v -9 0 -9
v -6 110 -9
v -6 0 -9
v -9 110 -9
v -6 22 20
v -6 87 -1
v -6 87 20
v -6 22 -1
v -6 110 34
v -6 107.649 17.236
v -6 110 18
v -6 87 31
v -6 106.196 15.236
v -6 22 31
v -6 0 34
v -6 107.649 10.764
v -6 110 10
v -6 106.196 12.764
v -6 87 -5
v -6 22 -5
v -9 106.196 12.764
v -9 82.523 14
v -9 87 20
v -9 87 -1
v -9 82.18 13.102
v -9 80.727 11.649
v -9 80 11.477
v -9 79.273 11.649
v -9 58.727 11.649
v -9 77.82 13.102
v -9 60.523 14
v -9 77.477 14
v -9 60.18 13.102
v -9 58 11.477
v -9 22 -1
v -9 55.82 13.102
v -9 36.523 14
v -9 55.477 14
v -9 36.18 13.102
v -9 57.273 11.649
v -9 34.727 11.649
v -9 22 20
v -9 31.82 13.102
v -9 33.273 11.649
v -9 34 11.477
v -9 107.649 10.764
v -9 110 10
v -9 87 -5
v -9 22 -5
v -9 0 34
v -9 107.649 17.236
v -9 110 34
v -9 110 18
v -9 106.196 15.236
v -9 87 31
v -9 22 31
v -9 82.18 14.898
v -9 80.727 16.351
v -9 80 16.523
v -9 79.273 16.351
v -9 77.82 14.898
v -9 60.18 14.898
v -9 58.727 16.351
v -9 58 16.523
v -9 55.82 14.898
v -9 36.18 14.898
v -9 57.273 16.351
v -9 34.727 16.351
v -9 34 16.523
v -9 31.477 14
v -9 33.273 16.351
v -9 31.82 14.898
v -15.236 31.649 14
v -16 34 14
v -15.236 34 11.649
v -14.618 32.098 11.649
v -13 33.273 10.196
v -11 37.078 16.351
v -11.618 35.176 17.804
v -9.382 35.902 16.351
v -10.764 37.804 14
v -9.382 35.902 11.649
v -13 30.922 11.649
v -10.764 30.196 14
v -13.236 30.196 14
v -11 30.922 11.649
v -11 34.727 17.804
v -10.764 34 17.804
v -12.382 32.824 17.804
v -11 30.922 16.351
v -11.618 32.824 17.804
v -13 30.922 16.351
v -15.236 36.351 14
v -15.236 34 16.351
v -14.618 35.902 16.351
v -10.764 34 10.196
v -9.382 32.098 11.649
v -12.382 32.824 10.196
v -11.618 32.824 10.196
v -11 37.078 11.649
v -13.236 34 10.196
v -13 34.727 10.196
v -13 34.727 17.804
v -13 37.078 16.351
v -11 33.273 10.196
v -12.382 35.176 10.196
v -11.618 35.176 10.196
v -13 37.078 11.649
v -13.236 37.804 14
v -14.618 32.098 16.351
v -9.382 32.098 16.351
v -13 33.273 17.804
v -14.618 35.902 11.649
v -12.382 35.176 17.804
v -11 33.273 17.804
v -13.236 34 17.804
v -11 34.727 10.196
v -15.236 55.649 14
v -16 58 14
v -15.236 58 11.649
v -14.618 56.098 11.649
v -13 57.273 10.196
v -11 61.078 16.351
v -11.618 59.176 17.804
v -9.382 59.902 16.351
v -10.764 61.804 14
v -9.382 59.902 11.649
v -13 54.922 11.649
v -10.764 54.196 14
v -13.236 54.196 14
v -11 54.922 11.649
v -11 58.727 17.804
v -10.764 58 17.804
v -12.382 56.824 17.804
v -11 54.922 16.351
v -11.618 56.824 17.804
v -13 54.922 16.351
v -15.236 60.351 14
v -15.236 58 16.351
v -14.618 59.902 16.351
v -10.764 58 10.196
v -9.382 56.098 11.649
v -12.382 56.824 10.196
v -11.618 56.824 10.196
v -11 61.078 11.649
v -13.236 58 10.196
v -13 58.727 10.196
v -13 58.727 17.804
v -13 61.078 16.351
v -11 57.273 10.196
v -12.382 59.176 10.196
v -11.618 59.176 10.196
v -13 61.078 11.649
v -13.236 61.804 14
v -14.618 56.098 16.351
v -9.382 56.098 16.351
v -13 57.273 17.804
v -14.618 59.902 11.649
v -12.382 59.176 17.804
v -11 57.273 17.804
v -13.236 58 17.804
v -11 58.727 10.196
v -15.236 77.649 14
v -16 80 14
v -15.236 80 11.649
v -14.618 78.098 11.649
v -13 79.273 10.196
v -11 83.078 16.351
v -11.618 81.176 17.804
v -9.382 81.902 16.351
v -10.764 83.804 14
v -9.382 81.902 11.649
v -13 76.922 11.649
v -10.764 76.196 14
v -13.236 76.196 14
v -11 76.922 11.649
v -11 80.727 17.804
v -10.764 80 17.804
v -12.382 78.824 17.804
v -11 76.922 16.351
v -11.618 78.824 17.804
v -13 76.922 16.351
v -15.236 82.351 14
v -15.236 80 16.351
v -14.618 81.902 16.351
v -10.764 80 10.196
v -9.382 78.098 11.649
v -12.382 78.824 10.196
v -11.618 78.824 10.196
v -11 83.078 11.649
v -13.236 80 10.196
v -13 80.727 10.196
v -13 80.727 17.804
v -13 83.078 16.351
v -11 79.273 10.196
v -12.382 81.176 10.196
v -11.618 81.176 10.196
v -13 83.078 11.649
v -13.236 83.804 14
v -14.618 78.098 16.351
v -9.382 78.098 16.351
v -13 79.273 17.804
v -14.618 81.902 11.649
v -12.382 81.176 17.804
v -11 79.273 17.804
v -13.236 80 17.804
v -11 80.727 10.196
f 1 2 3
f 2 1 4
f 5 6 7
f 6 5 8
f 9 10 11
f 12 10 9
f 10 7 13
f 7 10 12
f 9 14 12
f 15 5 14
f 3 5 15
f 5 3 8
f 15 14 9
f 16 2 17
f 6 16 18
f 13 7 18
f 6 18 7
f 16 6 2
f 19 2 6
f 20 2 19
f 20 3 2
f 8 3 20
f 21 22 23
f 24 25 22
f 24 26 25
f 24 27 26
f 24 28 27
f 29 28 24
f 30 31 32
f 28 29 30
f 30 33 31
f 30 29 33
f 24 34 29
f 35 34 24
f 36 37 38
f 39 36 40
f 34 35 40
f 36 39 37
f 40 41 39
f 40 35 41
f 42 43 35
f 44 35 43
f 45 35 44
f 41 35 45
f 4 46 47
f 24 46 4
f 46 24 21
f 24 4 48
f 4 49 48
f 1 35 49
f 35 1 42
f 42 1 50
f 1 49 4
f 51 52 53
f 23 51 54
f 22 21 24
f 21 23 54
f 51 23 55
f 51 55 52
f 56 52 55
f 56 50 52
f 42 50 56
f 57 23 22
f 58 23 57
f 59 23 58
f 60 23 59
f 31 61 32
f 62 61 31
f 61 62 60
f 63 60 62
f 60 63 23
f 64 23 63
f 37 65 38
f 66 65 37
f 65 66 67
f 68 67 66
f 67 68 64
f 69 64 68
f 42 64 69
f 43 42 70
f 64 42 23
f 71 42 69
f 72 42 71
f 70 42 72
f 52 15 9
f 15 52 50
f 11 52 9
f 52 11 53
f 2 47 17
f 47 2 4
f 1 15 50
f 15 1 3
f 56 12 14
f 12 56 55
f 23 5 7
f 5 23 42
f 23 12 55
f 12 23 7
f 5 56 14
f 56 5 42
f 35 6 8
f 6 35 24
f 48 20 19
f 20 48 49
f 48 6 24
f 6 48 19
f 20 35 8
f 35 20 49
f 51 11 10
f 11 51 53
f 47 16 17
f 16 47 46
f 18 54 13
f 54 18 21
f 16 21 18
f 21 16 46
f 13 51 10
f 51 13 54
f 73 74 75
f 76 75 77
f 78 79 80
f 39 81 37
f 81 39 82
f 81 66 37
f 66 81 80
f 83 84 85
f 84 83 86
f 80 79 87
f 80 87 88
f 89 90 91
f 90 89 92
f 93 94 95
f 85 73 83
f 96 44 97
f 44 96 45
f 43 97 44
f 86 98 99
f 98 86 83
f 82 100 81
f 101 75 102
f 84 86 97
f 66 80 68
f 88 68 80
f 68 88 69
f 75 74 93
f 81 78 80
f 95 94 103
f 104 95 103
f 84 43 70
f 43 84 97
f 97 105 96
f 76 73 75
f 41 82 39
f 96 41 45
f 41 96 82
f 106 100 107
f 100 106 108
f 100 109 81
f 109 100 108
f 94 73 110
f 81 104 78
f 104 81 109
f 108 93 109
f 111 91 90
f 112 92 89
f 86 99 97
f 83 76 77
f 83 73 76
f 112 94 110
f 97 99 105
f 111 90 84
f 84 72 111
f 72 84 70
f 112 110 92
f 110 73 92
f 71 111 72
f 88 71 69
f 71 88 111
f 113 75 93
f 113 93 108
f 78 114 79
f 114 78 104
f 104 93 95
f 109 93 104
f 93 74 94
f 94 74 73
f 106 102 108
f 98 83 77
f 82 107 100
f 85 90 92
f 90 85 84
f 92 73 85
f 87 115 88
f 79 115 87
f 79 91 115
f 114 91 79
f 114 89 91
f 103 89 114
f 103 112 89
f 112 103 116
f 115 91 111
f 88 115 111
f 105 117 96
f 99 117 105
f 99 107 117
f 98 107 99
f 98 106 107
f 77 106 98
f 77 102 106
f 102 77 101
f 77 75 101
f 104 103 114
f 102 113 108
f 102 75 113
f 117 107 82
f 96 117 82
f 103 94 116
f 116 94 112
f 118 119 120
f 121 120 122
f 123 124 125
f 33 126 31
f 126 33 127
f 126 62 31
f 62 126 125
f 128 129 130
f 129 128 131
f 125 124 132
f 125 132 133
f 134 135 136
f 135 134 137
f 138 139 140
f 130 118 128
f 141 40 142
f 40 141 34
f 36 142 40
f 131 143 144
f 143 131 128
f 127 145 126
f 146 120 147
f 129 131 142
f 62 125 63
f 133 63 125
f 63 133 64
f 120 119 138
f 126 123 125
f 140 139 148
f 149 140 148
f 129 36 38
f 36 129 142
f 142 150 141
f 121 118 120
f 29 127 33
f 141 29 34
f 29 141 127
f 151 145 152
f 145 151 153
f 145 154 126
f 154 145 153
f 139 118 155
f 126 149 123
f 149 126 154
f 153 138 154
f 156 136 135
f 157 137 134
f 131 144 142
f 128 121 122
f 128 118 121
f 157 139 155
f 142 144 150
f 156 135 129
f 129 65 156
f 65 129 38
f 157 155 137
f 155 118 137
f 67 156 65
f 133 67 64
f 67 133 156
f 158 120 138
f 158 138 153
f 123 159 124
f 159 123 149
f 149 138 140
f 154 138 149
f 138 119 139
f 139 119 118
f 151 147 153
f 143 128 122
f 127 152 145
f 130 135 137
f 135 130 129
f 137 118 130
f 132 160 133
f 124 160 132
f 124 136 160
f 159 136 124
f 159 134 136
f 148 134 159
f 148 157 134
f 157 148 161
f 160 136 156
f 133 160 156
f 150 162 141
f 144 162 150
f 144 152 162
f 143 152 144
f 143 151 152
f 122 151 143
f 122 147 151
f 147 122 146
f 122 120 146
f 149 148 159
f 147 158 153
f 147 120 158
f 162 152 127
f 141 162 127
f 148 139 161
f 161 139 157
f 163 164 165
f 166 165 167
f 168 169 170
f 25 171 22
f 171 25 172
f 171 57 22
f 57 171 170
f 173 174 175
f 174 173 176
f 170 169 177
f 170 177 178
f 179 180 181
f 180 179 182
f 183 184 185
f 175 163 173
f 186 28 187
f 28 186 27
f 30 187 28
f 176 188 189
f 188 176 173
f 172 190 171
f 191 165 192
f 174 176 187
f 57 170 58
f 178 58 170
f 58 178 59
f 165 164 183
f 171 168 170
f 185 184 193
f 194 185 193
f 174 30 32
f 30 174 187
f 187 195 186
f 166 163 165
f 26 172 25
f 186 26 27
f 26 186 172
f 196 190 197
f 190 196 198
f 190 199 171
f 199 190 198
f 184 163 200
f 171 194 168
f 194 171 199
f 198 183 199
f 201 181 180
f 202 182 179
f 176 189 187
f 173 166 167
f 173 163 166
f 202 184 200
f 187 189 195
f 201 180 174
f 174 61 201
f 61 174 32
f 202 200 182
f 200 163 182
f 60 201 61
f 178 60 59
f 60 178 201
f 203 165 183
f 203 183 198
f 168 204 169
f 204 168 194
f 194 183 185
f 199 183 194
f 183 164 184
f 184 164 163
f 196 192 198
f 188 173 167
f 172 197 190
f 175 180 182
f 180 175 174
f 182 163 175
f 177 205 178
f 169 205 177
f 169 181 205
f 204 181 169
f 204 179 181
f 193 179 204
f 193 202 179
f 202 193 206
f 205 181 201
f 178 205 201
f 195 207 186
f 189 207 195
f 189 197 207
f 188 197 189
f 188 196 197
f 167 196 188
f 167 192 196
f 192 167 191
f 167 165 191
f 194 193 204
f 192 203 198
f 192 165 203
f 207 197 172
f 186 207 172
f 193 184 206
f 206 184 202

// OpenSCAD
$fn=10;

/*
translate([-34,0,40]){
cube([43,110,3]);
}}
translate([35,22,26]){
cube([10,65,4]);
}
translate([35,22,-5]){
cube([10,65,4]);
}
*/




union(){
difference(){
rotate([0,90,0]){
translate([-34,0,-9]){
cube([43,110,3]);  //right plate.
}}
translate([-12,22,20]){  //charging handle
cube([10,65,11]);
}
translate([-12,22,-5]){  // bottom slot
cube([10,65,4]);
}
translate([-12,110,14]){
rotate([90,90,90]){
    cylinder(r=4,h=10);
}}}
translate([-12,34,14]){
    sphere(4);
}
translate([-12,58,14]){
    sphere(4);
}
translate([-12,80,14]){
    sphere(4);
}}
